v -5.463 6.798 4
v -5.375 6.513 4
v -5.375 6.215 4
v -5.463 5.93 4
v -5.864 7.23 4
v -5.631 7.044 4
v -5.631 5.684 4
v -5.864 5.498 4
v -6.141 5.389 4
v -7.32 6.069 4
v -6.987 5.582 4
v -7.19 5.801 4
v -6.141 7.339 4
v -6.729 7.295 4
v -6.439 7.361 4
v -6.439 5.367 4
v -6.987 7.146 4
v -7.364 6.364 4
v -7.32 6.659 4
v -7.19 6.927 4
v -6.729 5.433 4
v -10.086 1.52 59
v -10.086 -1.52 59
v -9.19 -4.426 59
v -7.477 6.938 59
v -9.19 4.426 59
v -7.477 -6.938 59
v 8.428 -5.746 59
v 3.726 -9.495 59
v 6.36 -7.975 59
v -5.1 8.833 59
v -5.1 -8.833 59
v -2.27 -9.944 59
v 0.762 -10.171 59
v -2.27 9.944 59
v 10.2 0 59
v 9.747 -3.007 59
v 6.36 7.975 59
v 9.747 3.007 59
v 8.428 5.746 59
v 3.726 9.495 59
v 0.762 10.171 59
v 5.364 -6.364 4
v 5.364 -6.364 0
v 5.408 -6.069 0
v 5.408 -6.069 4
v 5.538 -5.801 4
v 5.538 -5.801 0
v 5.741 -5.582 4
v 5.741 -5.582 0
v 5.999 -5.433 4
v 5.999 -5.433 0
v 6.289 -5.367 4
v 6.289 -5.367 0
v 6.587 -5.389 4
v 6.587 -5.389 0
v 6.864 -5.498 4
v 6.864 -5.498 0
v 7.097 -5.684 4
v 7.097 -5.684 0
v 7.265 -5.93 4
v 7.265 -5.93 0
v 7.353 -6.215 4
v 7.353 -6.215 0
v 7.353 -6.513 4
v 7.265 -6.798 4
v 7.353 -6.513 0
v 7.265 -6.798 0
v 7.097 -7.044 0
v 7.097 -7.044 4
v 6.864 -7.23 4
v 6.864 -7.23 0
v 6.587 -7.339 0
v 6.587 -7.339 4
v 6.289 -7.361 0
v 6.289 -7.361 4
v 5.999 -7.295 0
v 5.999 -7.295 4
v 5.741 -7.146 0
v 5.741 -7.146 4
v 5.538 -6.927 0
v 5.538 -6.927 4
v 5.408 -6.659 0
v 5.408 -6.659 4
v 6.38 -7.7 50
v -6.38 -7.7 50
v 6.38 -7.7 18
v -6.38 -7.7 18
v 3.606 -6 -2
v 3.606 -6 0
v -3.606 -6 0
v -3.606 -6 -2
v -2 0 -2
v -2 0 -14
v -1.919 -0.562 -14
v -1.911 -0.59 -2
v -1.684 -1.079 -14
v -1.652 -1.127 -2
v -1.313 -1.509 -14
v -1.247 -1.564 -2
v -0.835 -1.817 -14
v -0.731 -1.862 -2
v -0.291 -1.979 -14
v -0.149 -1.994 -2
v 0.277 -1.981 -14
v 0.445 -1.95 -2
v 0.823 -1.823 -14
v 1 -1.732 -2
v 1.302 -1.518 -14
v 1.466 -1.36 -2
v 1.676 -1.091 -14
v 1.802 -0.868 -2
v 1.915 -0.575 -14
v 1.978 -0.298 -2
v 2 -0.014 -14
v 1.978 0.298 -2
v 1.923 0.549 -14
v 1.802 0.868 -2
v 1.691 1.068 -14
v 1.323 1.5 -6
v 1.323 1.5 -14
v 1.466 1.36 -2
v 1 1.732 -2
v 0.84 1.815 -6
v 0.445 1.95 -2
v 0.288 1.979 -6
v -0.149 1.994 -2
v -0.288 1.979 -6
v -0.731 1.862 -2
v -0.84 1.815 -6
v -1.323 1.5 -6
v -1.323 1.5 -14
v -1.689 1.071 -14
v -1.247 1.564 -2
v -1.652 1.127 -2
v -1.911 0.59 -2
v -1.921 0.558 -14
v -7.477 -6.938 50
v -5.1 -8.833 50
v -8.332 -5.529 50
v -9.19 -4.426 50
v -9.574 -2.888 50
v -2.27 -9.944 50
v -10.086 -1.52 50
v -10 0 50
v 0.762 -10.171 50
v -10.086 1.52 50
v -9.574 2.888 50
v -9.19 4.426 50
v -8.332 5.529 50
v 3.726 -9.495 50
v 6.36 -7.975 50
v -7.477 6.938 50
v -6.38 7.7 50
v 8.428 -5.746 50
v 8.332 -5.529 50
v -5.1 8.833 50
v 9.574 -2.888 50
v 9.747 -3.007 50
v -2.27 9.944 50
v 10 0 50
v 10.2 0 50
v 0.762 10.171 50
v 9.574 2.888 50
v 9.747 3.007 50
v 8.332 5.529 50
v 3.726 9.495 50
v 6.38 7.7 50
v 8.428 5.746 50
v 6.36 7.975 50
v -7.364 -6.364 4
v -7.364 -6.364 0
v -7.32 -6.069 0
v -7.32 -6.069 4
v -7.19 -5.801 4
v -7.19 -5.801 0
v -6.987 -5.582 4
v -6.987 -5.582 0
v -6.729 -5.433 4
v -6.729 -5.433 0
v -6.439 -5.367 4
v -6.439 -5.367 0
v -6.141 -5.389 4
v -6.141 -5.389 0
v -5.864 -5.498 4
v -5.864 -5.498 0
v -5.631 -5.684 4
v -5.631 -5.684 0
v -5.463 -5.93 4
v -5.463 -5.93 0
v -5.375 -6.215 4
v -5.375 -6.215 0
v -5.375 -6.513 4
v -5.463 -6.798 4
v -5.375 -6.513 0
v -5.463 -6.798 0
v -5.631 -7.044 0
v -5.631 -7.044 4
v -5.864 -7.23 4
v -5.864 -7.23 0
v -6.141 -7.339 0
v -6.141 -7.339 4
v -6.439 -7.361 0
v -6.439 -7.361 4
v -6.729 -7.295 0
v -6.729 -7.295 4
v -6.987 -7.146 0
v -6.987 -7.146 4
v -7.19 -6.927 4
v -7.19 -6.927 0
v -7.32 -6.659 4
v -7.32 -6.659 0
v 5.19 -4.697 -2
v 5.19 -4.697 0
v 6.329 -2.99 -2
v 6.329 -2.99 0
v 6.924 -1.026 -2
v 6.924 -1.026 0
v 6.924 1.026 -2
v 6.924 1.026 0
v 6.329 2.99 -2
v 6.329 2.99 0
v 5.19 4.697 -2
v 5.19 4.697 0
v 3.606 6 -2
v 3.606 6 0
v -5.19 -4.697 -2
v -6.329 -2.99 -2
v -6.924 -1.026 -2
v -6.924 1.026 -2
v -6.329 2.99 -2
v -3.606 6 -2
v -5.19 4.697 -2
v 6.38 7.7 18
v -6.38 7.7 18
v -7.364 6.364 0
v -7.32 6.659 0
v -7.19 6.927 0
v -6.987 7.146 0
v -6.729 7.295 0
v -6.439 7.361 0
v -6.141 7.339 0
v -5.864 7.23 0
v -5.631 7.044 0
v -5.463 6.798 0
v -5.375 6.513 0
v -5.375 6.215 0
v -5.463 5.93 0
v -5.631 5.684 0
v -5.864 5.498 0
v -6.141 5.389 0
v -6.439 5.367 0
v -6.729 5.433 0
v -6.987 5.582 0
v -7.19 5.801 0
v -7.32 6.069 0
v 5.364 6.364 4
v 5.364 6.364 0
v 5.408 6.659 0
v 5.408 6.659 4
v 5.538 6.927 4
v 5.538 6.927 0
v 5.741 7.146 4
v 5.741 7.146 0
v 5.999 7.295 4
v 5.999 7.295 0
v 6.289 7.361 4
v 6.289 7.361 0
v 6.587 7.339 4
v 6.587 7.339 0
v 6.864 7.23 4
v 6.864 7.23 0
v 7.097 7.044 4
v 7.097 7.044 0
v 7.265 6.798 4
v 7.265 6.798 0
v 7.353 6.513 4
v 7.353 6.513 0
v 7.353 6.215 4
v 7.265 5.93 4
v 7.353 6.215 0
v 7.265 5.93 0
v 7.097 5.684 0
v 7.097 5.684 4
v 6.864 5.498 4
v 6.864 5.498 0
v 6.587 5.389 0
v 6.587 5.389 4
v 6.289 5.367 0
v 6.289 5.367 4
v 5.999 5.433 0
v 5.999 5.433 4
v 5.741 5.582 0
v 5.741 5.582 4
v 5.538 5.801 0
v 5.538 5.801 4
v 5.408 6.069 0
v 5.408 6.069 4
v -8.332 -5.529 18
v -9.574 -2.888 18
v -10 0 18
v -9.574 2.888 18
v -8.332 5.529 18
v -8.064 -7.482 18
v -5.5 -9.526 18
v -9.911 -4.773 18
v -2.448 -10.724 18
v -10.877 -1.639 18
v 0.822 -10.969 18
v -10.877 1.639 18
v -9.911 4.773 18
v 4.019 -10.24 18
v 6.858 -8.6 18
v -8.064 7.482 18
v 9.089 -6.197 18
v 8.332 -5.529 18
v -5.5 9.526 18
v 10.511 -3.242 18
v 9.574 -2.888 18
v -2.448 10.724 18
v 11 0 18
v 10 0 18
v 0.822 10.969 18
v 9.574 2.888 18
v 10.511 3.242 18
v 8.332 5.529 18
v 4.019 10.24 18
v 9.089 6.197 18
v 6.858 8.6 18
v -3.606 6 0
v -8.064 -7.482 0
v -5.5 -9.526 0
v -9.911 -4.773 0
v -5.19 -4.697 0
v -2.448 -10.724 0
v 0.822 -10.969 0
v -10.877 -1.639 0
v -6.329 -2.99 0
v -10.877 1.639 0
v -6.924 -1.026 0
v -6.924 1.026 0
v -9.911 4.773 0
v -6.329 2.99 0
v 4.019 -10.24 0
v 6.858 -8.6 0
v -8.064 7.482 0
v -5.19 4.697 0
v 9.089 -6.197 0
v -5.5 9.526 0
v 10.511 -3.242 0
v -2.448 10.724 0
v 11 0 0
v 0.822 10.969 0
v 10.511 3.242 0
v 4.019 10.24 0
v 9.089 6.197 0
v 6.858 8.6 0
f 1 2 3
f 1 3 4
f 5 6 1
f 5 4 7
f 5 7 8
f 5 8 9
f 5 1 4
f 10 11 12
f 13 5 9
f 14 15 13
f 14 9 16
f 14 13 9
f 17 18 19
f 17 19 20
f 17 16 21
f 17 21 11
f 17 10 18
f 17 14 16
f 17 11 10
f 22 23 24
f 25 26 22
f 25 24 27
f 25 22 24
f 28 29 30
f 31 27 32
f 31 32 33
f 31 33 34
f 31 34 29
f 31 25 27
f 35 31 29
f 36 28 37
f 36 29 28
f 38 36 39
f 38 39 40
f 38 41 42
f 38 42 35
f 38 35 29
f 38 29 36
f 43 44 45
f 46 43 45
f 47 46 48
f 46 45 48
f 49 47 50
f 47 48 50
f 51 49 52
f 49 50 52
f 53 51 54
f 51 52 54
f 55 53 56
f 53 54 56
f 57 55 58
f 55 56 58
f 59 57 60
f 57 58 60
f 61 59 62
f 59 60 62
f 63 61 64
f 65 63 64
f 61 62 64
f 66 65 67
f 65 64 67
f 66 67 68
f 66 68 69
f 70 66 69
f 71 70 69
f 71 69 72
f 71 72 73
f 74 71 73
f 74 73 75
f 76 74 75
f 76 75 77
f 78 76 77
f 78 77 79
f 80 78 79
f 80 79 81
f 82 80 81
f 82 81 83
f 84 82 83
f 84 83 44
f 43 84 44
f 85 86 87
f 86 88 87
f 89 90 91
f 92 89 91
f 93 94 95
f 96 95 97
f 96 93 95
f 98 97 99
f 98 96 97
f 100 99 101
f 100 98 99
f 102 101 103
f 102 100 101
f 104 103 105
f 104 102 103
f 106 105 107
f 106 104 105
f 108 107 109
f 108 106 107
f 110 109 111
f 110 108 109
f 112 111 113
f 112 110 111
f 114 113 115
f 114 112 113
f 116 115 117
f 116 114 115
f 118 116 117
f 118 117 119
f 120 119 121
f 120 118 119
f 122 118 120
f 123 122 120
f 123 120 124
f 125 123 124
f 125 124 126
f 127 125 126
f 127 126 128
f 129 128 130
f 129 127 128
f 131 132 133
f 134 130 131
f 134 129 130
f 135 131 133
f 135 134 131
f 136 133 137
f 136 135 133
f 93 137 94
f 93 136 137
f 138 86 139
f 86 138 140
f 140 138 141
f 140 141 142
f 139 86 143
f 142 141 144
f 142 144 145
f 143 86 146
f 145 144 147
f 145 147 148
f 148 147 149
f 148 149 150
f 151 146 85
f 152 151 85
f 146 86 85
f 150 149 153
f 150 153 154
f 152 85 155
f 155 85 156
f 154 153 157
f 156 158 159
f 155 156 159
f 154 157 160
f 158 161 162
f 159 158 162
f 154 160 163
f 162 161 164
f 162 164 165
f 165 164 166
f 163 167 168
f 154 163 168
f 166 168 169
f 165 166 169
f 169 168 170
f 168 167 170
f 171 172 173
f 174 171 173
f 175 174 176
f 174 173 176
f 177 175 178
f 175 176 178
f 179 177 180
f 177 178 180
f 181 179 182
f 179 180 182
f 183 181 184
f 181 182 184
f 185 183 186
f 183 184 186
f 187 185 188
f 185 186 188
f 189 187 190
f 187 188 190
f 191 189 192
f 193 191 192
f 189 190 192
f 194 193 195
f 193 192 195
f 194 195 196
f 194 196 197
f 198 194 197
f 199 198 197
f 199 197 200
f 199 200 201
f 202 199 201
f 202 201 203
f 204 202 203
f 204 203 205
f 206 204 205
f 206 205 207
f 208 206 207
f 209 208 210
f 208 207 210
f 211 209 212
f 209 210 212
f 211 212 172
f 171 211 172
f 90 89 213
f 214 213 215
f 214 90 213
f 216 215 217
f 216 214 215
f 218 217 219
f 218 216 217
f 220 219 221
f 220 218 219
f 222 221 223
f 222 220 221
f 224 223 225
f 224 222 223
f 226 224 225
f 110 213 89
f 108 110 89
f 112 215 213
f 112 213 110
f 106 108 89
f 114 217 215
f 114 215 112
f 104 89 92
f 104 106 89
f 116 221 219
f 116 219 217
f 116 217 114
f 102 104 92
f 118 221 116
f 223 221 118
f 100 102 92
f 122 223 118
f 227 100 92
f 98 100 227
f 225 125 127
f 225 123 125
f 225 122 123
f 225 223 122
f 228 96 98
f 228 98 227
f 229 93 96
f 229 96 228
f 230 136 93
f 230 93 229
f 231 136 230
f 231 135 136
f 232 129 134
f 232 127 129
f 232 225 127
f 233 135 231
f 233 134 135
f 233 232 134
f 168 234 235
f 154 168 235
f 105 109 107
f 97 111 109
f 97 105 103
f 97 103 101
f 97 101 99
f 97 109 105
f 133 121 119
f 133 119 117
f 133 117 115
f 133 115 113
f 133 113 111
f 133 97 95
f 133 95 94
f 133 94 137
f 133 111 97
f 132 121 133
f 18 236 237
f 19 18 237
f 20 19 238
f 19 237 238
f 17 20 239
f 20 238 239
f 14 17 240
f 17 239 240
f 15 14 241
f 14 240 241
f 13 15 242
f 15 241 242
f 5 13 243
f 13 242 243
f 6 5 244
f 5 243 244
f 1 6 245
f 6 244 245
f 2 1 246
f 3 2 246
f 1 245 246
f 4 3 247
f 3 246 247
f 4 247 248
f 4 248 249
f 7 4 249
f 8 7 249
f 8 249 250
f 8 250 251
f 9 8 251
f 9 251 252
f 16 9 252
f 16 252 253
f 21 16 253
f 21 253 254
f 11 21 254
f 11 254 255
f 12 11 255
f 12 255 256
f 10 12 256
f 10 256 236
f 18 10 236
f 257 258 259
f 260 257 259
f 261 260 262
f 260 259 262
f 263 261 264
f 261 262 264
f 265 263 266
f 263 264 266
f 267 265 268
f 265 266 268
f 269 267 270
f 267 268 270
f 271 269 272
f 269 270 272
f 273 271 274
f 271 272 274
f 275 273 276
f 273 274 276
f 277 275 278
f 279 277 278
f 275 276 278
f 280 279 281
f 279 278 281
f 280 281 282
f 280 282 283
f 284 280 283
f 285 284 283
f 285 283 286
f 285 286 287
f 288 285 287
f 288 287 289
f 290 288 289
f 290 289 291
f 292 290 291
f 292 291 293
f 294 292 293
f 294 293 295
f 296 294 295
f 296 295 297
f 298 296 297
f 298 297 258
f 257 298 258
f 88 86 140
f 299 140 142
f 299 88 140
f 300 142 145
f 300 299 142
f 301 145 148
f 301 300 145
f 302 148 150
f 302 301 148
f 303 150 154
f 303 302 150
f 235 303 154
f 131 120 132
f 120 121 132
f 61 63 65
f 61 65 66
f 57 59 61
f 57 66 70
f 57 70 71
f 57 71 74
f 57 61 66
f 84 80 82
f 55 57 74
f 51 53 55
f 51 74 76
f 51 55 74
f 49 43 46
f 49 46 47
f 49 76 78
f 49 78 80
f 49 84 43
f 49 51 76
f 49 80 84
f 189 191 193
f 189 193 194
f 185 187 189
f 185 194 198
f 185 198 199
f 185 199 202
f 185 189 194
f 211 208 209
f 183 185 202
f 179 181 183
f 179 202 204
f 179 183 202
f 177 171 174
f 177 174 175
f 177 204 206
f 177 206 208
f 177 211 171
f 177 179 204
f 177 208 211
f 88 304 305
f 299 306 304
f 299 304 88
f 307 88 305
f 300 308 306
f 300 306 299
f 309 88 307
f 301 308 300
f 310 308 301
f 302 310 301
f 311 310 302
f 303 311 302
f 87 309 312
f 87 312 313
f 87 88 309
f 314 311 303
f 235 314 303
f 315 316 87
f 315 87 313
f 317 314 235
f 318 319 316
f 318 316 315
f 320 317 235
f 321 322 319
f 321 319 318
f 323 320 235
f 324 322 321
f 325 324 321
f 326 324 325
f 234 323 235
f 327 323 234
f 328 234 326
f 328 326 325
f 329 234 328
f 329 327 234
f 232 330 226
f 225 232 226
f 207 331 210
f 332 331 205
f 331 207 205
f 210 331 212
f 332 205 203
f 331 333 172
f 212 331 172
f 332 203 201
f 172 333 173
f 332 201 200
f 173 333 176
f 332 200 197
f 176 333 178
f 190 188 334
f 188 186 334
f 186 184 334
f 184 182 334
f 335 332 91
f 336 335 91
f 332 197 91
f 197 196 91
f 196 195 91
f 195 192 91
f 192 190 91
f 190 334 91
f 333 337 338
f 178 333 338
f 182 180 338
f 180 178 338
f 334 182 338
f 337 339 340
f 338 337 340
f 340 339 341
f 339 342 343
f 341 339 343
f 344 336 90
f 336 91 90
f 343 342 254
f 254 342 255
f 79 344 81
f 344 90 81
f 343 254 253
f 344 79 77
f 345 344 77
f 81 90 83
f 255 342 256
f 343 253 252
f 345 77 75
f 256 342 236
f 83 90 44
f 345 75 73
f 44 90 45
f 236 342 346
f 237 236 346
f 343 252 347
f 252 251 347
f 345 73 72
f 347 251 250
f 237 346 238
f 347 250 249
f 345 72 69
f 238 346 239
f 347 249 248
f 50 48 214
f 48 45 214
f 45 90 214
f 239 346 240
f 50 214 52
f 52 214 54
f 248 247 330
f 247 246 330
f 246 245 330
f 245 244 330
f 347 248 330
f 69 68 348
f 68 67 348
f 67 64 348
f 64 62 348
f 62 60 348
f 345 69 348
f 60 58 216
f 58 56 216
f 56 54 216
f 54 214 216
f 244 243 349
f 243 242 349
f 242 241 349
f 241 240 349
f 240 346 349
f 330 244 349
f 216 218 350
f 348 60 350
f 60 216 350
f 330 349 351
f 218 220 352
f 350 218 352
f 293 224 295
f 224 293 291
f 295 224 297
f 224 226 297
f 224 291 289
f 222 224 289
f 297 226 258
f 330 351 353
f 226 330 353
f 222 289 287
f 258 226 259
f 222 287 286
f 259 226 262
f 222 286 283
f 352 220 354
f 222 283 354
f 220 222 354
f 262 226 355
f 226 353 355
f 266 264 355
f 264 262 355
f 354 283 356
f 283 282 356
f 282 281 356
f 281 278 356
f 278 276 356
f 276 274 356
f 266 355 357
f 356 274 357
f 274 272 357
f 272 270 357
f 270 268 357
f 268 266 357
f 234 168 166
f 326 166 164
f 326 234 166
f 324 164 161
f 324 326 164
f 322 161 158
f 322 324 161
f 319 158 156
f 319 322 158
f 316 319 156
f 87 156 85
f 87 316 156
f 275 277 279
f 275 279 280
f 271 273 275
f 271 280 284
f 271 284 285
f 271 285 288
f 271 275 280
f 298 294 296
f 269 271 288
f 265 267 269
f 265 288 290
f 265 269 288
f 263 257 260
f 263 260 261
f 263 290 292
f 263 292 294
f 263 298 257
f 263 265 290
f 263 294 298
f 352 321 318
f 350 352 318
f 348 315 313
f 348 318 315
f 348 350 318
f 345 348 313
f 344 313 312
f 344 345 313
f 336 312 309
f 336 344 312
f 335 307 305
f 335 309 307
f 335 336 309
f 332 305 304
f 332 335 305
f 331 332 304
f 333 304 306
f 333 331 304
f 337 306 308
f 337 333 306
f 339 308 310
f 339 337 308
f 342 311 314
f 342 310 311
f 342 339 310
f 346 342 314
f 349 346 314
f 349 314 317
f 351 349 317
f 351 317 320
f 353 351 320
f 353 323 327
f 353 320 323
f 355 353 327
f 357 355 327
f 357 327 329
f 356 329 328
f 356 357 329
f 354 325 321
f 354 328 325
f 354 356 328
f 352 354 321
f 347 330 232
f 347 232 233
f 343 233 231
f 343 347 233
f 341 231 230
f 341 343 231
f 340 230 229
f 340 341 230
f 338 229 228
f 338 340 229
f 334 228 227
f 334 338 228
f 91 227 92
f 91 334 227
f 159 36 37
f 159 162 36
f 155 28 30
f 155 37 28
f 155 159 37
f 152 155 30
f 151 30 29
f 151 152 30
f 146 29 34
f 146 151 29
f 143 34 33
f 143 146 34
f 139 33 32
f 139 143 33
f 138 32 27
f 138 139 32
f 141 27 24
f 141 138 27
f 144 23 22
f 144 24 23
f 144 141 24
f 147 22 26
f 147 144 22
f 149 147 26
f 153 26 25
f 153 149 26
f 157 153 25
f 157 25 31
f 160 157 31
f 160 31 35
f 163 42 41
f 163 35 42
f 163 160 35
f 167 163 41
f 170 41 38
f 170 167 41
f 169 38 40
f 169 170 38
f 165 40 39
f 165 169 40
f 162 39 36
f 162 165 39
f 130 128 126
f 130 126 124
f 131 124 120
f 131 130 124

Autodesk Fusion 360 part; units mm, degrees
sketch "スケッチ1" plane through (0, 0, 0) normal (0, 0, 1) x (1, 0, 0)
  circle A0 centre (0, 0) radius 11
  dimension "d1" = 22
extrude "押し出し1" add sketch "スケッチ1" along normal blind 18
sketch "スケッチ2" plane through (0, 0, 18) normal (0, 0, 1) x (1, 0, 0)
  circle A0 centre (0, 0) radius 11
  circle A1 centre (0, 0) radius 10
  line L0 (-7, -7.7) -> (7, -7.7)
  line L1 (7, -7.7) -> (7, 7.7)
  line L2 (7, 7.7) -> (-7, 7.7)
  line L3 (-7, 7.7) -> (-7, -7.7)
  line L4 (-7, -7.7) -> (7, 7.7) construction
  line L5 (7, -7.7) -> (-7, 7.7) construction
  dimension "d4" = 20
  dimension "d5" = 14
  dimension "d6" = 15.4
sketch "スケッチ3" plane through (0, 0, 18) normal (0, 0, 1) x (1, 0, 0)
extrude "押し出し2" add sketch "スケッチ2" along normal blind 32 contours A1 L1 | A1 L0 L1 L2 L3 | A1 L3
sketch "スケッチ4" plane through (0, 0, 50) normal (0, 0, 1) x (1, 0, 0)
  arc A0 (6.3804, -7.7) -> (6.3804, 7.7) centre (0, 0) ccw
  line L0 (6.3804, 7.7) -> (-6.3804, 7.7)
  arc A1 (-6.3804, 7.7) -> (-6.3804, -7.7) centre (0, 0) ccw
  line L1 (-6.3804, -7.7) -> (6.3804, -7.7)
  circle A2 centre (0, 0) radius 10.2
  dimension "d9" = 20.4
extrude "押し出し3" add sketch "スケッチ4" along normal blind 9 contours A0 L0 A1 L1 | A2
sketch "スケッチ5" plane through (0, 0, 0) normal (0, 0, -1) x (-1, 0, 0)
  circle A0 centre (0, 0) radius 11
  circle A1 centre (0, 0) radius 6.9
  line L0 (6, 3.45) -> (-6, 3.45)
  line L1 (-6, 3.45) -> (-6, -3.45)
  line L2 (-6, -3.45) -> (6, -3.45)
  line L3 (6, -3.45) -> (6, 3.45)
  line L4 (6, 3.45) -> (-6, -3.45) construction
  line L5 (-6, 3.45) -> (6, -3.45) construction
  dimension "d12" = 13.8
  dimension "d13" = 12
  dimension "d14" = 6.9
extrude "押し出し4" add sketch "スケッチ5" along normal blind 2 contours A1 L3 | A1 L0 L1 L2 L3 | A1 L1
sketch "スケッチ6" plane through (0, 0, -2) normal (0, 0, -1) x (-1, 0, 0)
  arc A0 (-5.9756, 3.45) -> (-5.9756, -3.45) centre (0, 0) ccw
  line L0 (-5.9756, -3.45) -> (5.9756, -3.45)
  arc A1 (5.9756, -3.45) -> (5.9756, 3.45) centre (0, 0) ccw
  line L1 (5.9756, 3.45) -> (-5.9756, 3.45)
  circle A2 centre (0, 0) radius 2
  dimension "d17" = 4
extrude "押し出し5" add sketch "スケッチ6" along normal blind 4 contours A2
sketch "スケッチ8" plane through (0, 0, 18) normal (0, 0, 1) x (1, 0, 0)
  circle A0 centre (0, 0) radius 2
  dimension "d22" = 4
extrude "押し出し6" add 1 faces at (-0.637, 0.1965, -6) along direction (0, 0, -1) blind 8
sketch "スケッチ9" plane through (0, 0, -14) normal (0, 0, -1) x (-1, 0, 0)
  circle A0 centre (0, 0) radius 2
  line L0 (0, 2) -> (-2.3, 2)
  line L1 (-2.3, 2) -> (-2.3, 1.5)
  line L2 (-2.3, 1.5) -> (0, 1.5)
  line L3 (0, 1.5) -> (0, 2)
  circle A1 centre (0, 0) radius 2
  line L4 (0, 1.5) -> (1.7491, 1.5)
  line L5 (1.7491, 1.5) -> (1.7491, 2)
  line L6 (1.7491, 2) -> (0, 2)
  line L7 (0, 2) -> (0, 1.5)
extrude "押し出し7" cut sketch "スケッチ9" against normal blind 8 contours A0 L3 A1 L4 L7 | A0 L2 L3 A1 L7
sketch "スケッチ10" plane through (0, 0, 0) normal (0, 0, -1) x (-1, 0, 0)
  line L0 (-5.9756, 3.45) -> (5.9756, 3.45)
  arc A0 (5.9756, -3.45) -> (5.9756, 3.45) centre (0, 0) ccw
  line L1 (5.9756, -3.45) -> (-5.9756, -3.45)
  arc A1 (-5.9756, 3.45) -> (-5.9756, -3.45) centre (0, 0) ccw
  circle A2 centre (0, 0) radius 11
  circle A3 centre (0, 0) radius 7
  line L2 (7, 6) -> (-7, 6)
  line L3 (-7, 6) -> (-7, -6)
  line L4 (-7, -6) -> (7, -6)
  line L5 (7, -6) -> (7, 6)
  line L6 (7, 6) -> (-7, -6) construction
  line L7 (-7, 6) -> (7, -6) construction
  dimension "d27" = 14
  dimension "d28" = 14
  dimension "d29" = 12
extrude "押し出し8" add sketch "スケッチ10" along normal blind 2 contours A3 L2 L4
sketch "スケッチ11" plane through (0, 0, 0) normal (0, 0, -1) x (-1, 0, 0)
  line L0 (-3.6056, 6) -> (3.6056, 6)
  arc A0 (3.6056, -6) -> (3.6056, 6) centre (0, 0) ccw
  line L1 (3.6056, -6) -> (-3.6056, -6)
  arc A1 (-3.6056, 6) -> (-3.6056, -6) centre (0, 0) ccw
  circle A2 centre (0, 0) radius 11
sketch "スケッチ12" plane through (0, 0, 0) normal (0, 0, -1) x (-1, 0, 0)
  line L0 (11, 0) -> (-11, 0)
  line L1 (-11, 0) -> (-11, -11)
  line L2 (-11, -11) -> (0, 0)
  line L3 (0, 0) -> (7.7782, 7.7782)
  circle A0 centre (0, 0) radius 9
  circle A1 centre (-6.364, -6.364) radius 1
  line L4 (0, 1.75) -> (0, 22.5)
  circle A2 centre (6.364, -6.364) radius 1
  circle A3 centre (6.364, 6.364) radius 1
  circle A4 centre (-6.364, 6.364) radius 1
  dimension "d32" = 11
  dimension "d33" = 180
  dimension "d34" = 11
  dimension "d35" = 18
  dimension "d36" = 2
extrude "押し出し9" cut sketch "スケッチ12" against normal blind 4 contours L3 A0 A3 | L3 A0 A3 | A0 A2 | A0 A2 | L2 A0 A1 | L2 A0 A1 | L3 A0 A3 | L3 A0 A3 | A0 A4 | A0 A4 | L2 A0 A1 | L2 A0 A1
sketch "スケッチ14" plane through (0, 0, 50) normal (0, 0, -1) x (-1, 0, 0)
  circle A0 centre (0, 0) radius 10.2
  line L0 (6.3804, -7.7) -> (-6.3804, -7.7)
  arc A1 (-6.3804, 7.7) -> (-6.3804, -7.7) centre (0, 0) ccw
  line L1 (-6.3804, 7.7) -> (6.3804, 7.7)
  arc A2 (6.3804, -7.7) -> (6.3804, 7.7) centre (0, 0) ccw
